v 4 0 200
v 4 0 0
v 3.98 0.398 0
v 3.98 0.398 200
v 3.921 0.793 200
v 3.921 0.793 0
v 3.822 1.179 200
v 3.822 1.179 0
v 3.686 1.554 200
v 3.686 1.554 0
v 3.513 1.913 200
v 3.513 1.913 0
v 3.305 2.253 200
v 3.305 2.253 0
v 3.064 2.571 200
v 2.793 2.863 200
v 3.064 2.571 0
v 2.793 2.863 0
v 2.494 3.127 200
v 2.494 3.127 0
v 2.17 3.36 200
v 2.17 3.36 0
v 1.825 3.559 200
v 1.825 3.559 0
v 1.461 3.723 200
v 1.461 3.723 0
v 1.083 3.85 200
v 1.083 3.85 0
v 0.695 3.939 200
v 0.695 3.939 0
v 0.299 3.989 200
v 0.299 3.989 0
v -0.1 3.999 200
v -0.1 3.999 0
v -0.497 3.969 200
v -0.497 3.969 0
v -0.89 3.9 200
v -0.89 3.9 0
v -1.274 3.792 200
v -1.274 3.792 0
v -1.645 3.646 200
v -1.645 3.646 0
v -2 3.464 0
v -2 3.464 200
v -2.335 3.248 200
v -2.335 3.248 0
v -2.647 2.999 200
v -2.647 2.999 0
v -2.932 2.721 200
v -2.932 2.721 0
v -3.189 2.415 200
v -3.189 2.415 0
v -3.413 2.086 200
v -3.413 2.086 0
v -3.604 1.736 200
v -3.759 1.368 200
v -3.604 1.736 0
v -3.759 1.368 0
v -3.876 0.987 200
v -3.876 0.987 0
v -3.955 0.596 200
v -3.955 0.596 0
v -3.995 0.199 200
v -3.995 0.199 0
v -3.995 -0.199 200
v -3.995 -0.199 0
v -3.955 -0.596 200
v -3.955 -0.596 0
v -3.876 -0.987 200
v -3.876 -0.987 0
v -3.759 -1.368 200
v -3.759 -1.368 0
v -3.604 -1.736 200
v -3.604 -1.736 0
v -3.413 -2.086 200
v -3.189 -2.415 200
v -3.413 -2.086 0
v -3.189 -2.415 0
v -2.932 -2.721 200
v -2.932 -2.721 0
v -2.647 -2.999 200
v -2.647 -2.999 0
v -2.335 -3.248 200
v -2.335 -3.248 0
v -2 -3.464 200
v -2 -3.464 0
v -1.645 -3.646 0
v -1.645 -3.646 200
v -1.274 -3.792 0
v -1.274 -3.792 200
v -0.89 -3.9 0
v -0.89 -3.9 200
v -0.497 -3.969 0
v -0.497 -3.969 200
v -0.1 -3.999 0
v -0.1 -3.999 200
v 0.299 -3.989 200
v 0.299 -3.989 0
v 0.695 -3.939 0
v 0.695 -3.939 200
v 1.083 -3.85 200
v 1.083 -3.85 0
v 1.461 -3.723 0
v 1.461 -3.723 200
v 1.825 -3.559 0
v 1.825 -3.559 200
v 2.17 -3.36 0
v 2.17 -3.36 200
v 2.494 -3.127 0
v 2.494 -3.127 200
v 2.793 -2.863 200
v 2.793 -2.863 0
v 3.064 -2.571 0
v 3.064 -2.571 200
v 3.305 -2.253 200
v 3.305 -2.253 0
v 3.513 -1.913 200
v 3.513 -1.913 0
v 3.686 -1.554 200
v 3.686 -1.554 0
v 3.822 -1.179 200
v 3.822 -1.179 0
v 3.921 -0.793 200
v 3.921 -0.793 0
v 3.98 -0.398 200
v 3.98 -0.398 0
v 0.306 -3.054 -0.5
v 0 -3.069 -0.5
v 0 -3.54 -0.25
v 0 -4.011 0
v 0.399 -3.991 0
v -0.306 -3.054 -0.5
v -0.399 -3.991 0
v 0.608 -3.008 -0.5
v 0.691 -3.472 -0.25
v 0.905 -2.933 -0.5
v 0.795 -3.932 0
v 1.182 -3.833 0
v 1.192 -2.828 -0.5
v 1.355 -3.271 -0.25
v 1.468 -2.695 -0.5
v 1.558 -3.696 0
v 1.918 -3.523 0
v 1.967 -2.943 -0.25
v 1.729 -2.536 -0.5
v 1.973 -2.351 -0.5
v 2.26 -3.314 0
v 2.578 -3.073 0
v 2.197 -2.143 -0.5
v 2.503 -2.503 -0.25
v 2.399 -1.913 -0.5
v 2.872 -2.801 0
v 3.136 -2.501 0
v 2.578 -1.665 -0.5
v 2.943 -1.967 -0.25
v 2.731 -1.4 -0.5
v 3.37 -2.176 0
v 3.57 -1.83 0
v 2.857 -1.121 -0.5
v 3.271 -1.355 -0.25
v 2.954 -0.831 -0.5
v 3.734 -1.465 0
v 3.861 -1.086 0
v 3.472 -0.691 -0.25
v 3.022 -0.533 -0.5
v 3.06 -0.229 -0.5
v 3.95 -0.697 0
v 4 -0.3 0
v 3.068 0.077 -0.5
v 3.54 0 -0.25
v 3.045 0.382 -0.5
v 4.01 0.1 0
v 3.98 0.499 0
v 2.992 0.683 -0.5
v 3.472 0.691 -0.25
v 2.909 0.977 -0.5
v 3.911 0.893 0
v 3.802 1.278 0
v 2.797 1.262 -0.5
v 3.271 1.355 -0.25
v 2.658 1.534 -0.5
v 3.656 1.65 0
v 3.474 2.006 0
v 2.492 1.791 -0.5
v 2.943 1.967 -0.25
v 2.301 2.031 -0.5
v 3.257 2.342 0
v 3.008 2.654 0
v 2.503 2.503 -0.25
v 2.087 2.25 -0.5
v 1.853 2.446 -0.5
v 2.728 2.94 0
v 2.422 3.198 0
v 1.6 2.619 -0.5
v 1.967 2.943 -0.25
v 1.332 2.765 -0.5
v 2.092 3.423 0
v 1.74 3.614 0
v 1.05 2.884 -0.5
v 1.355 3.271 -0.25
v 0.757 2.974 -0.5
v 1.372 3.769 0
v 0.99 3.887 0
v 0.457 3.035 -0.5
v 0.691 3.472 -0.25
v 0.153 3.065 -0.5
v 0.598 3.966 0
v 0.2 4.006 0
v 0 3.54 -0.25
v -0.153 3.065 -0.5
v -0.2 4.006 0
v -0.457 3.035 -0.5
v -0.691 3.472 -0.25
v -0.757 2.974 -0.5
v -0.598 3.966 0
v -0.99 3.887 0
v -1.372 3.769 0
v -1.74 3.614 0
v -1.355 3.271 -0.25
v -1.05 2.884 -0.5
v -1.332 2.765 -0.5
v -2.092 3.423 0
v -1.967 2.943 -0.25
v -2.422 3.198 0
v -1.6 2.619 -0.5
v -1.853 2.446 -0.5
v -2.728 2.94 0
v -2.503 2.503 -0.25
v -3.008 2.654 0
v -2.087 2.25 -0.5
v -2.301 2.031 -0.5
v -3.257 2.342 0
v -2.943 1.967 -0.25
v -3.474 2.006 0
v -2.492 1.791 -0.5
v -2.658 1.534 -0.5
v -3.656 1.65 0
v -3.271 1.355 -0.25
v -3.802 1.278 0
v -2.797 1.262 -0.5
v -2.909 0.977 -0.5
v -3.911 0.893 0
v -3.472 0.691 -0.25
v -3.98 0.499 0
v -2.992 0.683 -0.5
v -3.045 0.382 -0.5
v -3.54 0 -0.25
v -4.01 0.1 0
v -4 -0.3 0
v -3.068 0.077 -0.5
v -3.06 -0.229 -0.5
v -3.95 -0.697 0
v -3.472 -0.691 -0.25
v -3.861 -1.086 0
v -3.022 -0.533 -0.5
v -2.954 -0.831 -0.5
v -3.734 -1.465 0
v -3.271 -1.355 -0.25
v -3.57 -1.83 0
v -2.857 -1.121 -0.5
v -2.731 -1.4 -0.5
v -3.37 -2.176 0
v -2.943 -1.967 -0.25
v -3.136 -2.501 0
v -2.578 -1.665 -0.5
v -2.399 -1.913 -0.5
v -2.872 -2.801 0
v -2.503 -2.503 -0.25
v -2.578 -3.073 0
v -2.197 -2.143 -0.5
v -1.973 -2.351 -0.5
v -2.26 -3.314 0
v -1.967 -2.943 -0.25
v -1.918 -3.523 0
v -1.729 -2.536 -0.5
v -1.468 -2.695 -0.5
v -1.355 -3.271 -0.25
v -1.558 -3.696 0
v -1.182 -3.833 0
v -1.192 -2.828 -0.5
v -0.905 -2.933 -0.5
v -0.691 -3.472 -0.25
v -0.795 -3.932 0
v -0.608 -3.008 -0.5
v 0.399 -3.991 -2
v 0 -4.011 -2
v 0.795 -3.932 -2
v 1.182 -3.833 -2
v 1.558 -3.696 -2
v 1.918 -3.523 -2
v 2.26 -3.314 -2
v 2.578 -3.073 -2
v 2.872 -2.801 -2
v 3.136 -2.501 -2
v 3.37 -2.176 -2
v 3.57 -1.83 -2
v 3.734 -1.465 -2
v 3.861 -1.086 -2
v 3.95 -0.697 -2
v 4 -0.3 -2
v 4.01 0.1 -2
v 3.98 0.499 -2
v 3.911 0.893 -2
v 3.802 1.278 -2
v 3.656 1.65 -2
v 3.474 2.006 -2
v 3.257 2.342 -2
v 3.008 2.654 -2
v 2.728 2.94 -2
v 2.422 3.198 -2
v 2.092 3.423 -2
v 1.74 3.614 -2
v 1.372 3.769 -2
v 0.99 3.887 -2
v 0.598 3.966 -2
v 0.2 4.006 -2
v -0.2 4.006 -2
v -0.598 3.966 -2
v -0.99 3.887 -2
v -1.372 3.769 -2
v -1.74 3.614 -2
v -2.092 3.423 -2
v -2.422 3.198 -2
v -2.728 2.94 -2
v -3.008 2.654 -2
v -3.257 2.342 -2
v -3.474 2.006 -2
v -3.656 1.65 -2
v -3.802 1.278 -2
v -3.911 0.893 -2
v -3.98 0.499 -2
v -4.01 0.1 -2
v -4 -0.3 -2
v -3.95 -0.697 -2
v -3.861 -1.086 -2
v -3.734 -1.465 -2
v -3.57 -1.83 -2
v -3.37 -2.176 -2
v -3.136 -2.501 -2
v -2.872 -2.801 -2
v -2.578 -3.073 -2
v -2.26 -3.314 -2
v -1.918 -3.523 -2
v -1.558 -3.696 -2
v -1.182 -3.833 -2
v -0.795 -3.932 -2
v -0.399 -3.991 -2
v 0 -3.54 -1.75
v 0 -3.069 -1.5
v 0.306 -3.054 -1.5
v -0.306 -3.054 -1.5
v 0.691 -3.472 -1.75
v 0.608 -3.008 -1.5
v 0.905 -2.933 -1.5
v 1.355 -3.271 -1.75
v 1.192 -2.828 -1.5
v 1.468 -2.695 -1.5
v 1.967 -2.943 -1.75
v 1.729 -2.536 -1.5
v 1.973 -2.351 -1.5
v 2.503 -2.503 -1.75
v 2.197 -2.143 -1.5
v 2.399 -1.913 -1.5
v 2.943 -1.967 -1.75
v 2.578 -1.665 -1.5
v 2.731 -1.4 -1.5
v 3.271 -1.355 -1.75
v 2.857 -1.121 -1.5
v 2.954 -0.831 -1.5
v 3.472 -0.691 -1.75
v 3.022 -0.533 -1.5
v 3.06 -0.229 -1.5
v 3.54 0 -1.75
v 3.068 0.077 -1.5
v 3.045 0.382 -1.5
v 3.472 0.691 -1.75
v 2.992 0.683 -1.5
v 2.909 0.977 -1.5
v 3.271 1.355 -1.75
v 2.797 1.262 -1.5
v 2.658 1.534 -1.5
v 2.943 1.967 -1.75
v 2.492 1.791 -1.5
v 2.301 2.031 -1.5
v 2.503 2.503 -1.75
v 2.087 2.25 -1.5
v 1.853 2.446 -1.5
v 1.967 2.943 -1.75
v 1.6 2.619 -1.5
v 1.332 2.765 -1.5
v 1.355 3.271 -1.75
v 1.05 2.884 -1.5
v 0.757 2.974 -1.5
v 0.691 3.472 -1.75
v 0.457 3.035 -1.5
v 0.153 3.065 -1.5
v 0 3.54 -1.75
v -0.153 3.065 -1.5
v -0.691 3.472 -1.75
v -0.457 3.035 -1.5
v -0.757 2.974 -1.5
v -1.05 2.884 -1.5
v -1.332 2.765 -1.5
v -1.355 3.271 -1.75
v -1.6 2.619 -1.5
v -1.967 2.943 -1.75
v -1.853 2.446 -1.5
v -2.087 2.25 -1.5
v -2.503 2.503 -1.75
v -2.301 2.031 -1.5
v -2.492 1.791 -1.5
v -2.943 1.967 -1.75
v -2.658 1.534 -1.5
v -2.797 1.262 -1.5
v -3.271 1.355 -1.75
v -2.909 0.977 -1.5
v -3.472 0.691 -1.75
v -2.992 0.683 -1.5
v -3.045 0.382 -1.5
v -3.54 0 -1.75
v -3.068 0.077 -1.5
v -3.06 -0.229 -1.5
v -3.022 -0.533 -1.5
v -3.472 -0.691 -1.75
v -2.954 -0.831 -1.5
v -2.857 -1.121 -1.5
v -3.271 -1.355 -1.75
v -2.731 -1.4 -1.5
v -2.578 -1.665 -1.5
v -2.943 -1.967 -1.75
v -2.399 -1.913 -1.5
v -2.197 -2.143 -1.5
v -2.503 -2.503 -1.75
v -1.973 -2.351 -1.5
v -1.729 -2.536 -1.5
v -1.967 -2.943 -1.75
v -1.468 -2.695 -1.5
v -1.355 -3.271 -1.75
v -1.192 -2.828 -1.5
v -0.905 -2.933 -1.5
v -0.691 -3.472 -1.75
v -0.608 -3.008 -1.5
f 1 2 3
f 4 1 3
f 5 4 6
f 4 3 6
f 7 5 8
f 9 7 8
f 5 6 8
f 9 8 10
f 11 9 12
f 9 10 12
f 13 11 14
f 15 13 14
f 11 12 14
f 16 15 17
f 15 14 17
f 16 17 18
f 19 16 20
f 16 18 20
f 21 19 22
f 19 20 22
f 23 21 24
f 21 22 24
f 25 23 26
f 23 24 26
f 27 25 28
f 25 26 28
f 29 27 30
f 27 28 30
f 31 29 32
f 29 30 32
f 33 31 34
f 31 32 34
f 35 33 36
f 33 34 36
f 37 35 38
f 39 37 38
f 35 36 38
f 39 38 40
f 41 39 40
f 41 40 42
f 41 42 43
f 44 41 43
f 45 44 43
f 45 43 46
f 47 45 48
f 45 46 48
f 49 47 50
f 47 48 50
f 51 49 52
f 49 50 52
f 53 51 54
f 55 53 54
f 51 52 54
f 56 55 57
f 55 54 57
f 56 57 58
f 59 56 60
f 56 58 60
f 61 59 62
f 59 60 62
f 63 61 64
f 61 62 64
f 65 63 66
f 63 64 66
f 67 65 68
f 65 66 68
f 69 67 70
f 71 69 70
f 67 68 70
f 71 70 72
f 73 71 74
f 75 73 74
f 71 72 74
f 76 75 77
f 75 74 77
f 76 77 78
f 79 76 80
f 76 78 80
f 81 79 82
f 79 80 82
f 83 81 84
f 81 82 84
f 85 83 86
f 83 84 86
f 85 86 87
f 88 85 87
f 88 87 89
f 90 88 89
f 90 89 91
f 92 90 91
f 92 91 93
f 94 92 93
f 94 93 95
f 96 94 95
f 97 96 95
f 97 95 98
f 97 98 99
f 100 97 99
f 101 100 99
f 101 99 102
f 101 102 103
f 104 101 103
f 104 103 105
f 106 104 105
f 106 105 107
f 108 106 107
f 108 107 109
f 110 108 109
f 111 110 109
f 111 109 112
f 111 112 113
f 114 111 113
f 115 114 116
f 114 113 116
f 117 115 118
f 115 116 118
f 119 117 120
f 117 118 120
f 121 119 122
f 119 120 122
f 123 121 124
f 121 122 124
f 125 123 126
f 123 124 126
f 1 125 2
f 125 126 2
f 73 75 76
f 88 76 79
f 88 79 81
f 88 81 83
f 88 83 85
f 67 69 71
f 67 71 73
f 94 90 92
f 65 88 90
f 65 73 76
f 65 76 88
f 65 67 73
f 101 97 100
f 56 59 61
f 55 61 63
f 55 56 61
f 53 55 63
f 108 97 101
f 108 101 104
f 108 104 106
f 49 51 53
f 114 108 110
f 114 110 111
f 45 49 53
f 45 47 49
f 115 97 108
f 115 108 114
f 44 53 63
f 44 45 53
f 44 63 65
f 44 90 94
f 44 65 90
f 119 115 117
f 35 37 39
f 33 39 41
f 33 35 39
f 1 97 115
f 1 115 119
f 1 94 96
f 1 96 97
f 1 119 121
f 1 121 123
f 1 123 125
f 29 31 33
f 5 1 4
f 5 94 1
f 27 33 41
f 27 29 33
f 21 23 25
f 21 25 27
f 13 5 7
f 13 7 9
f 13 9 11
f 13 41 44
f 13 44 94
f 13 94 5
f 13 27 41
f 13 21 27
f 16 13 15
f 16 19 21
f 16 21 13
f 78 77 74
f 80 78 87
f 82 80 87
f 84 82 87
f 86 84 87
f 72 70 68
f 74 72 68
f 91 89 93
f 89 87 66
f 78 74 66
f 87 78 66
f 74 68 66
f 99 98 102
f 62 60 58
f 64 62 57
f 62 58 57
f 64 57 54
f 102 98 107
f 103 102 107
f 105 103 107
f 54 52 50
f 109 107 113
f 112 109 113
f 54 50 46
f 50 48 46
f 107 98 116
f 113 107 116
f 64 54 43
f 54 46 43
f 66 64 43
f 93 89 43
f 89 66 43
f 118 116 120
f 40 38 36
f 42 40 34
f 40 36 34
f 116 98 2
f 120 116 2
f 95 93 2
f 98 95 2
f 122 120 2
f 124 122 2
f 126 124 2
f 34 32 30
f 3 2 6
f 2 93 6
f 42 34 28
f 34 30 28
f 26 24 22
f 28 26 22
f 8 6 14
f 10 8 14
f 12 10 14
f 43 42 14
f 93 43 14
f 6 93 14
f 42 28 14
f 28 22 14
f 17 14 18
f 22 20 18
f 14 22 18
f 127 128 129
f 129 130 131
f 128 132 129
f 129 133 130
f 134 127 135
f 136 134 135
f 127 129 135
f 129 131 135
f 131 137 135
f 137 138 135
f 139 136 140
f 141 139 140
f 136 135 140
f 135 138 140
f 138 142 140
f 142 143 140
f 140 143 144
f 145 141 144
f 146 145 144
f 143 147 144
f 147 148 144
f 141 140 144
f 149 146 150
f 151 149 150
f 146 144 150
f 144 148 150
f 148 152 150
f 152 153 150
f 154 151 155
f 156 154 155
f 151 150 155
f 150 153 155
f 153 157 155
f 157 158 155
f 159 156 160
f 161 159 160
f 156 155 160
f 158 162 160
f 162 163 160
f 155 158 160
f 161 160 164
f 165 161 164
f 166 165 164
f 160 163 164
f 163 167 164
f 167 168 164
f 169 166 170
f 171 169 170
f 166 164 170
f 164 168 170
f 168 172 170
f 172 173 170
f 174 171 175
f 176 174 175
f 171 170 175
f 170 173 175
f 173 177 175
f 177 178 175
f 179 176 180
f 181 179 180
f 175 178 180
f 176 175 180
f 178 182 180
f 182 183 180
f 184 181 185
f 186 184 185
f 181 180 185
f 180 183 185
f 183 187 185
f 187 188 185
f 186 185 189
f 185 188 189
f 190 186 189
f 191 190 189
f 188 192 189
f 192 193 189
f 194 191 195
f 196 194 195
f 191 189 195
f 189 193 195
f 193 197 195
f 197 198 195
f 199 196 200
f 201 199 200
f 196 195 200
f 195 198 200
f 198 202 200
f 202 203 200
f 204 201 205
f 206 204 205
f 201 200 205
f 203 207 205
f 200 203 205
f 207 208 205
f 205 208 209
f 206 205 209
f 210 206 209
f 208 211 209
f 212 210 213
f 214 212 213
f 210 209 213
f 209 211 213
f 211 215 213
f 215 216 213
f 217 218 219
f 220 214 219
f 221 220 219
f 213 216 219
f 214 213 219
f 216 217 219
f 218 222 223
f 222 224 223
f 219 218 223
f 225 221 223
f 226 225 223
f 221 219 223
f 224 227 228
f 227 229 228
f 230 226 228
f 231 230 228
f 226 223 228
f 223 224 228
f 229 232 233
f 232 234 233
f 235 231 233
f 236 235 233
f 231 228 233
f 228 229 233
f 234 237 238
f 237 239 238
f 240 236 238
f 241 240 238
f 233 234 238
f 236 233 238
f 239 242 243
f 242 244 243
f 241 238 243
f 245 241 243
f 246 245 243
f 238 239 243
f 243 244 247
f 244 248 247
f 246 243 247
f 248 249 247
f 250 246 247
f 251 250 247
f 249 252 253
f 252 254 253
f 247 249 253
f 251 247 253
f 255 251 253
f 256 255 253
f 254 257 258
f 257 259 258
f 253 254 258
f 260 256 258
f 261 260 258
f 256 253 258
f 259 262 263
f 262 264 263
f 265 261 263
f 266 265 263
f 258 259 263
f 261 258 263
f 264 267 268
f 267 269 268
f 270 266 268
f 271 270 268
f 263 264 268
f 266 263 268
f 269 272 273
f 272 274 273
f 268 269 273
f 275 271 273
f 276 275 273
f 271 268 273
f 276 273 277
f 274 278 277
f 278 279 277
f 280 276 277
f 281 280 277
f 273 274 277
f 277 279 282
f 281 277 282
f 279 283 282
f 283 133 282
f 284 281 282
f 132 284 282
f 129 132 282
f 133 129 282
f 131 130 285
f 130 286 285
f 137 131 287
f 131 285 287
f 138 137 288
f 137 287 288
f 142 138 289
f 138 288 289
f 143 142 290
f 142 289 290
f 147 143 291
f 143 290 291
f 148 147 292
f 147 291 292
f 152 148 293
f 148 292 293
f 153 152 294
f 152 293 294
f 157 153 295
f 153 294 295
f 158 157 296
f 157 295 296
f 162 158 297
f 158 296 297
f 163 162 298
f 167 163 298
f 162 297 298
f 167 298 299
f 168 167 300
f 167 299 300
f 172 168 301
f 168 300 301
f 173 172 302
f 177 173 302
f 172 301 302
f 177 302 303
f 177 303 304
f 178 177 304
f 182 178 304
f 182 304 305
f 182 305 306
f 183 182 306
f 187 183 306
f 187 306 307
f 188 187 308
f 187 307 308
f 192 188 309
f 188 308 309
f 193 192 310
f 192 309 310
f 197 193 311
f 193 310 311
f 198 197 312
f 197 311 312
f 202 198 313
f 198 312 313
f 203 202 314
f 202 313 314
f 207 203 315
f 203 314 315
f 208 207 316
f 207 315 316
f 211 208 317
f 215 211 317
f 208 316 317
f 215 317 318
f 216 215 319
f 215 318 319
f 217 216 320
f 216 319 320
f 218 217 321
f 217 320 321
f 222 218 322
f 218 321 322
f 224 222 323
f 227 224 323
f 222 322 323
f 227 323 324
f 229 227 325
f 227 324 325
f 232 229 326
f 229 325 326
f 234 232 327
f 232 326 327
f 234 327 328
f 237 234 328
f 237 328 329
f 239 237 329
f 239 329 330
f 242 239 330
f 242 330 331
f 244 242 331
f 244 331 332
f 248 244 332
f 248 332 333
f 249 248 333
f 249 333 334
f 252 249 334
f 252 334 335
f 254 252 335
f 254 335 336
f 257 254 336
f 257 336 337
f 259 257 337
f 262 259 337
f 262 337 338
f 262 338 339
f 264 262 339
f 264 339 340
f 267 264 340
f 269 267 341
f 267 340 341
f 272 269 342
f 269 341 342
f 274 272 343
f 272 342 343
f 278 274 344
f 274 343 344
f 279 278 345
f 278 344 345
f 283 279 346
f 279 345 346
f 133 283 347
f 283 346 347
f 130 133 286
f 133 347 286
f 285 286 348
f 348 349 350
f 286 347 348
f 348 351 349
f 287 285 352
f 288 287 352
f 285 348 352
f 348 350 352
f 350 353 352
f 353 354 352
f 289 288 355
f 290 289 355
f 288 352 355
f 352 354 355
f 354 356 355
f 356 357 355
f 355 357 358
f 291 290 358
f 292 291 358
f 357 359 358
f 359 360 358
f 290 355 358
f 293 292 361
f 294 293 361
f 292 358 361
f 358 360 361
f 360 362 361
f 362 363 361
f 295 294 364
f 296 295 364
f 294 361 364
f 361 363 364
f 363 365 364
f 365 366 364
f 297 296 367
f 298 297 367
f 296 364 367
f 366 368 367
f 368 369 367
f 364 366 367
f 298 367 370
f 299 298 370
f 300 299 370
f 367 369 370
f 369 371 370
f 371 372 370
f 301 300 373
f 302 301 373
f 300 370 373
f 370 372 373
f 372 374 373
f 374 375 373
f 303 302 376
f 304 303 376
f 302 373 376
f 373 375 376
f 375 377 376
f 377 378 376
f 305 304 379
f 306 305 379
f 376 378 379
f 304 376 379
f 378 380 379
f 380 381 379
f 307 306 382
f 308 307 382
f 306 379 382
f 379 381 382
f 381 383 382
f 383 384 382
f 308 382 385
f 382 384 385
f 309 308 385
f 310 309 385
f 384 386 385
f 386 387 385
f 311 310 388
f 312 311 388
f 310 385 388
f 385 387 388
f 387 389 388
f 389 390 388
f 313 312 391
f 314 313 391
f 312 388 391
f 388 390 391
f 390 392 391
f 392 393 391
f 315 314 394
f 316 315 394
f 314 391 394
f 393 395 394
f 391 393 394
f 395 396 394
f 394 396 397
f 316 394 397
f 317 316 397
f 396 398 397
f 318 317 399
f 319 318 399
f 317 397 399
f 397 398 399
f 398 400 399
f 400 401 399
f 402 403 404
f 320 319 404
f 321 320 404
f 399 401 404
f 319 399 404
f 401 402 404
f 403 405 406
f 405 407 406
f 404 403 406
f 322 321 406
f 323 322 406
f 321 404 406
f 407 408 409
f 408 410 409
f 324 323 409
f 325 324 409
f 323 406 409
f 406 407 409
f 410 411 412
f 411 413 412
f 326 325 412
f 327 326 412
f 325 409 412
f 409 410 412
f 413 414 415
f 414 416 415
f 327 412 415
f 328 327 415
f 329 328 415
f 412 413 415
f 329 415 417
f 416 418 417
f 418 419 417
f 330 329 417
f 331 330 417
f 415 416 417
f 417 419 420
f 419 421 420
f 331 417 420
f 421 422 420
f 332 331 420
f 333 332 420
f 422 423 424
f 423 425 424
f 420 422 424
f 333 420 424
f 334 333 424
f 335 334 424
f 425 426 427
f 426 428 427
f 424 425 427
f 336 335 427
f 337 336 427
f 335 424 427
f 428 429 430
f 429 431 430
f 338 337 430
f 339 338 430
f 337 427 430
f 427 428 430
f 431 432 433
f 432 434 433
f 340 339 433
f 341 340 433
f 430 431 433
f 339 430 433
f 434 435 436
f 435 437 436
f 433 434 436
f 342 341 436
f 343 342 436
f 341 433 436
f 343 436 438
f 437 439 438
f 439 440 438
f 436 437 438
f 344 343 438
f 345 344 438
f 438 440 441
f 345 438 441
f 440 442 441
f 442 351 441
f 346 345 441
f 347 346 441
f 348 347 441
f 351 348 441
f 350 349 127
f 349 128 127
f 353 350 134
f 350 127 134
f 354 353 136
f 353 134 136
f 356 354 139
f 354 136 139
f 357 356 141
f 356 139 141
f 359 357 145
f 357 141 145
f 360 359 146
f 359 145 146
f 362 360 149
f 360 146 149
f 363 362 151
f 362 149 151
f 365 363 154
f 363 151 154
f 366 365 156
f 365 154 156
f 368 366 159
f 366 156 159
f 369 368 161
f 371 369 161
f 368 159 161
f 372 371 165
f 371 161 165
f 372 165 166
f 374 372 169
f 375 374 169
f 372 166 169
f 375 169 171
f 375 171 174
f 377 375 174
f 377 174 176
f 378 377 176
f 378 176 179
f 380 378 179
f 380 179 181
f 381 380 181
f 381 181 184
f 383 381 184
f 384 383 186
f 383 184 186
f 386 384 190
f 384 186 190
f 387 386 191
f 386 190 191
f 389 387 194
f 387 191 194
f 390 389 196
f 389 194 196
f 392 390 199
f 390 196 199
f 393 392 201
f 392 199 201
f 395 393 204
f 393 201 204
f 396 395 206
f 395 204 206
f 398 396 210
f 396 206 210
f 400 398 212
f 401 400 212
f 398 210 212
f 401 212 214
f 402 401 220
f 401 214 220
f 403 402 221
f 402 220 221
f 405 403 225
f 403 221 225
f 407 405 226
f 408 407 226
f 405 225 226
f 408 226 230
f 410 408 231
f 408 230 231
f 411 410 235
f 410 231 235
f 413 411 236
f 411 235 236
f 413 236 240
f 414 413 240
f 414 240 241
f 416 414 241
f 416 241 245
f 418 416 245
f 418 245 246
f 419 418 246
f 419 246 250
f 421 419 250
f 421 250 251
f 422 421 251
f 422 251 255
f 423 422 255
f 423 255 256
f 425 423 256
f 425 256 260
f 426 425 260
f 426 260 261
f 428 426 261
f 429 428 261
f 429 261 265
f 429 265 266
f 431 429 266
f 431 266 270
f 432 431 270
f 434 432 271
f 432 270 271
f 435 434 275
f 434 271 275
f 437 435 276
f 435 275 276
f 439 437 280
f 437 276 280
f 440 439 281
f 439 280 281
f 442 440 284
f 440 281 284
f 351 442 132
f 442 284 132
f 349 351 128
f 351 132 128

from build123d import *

# Parameters (mm, degrees)
F0_R     = 4
F1_DEPTH = 200


with BuildPart() as f1:
    # F0 (on Top) → F1 (new body)
    with BuildSketch(Plane.XY):
        Circle(F0_R)
    extrude(amount=F1_DEPTH)


with BuildPart() as f3:
    # F2 (on Right) → F3 (revolve)
    with BuildSketch(Plane.YZ):
        Polygon((-3.068931, -0.5), (-4.011301, 0), (-4.011301, -2), (-3.068931, -1.5), align=None)
    revolve(axis=Axis((0, 0, 0), (0, 0, 1)))


solid = Compound([f1.part, f3.part])
